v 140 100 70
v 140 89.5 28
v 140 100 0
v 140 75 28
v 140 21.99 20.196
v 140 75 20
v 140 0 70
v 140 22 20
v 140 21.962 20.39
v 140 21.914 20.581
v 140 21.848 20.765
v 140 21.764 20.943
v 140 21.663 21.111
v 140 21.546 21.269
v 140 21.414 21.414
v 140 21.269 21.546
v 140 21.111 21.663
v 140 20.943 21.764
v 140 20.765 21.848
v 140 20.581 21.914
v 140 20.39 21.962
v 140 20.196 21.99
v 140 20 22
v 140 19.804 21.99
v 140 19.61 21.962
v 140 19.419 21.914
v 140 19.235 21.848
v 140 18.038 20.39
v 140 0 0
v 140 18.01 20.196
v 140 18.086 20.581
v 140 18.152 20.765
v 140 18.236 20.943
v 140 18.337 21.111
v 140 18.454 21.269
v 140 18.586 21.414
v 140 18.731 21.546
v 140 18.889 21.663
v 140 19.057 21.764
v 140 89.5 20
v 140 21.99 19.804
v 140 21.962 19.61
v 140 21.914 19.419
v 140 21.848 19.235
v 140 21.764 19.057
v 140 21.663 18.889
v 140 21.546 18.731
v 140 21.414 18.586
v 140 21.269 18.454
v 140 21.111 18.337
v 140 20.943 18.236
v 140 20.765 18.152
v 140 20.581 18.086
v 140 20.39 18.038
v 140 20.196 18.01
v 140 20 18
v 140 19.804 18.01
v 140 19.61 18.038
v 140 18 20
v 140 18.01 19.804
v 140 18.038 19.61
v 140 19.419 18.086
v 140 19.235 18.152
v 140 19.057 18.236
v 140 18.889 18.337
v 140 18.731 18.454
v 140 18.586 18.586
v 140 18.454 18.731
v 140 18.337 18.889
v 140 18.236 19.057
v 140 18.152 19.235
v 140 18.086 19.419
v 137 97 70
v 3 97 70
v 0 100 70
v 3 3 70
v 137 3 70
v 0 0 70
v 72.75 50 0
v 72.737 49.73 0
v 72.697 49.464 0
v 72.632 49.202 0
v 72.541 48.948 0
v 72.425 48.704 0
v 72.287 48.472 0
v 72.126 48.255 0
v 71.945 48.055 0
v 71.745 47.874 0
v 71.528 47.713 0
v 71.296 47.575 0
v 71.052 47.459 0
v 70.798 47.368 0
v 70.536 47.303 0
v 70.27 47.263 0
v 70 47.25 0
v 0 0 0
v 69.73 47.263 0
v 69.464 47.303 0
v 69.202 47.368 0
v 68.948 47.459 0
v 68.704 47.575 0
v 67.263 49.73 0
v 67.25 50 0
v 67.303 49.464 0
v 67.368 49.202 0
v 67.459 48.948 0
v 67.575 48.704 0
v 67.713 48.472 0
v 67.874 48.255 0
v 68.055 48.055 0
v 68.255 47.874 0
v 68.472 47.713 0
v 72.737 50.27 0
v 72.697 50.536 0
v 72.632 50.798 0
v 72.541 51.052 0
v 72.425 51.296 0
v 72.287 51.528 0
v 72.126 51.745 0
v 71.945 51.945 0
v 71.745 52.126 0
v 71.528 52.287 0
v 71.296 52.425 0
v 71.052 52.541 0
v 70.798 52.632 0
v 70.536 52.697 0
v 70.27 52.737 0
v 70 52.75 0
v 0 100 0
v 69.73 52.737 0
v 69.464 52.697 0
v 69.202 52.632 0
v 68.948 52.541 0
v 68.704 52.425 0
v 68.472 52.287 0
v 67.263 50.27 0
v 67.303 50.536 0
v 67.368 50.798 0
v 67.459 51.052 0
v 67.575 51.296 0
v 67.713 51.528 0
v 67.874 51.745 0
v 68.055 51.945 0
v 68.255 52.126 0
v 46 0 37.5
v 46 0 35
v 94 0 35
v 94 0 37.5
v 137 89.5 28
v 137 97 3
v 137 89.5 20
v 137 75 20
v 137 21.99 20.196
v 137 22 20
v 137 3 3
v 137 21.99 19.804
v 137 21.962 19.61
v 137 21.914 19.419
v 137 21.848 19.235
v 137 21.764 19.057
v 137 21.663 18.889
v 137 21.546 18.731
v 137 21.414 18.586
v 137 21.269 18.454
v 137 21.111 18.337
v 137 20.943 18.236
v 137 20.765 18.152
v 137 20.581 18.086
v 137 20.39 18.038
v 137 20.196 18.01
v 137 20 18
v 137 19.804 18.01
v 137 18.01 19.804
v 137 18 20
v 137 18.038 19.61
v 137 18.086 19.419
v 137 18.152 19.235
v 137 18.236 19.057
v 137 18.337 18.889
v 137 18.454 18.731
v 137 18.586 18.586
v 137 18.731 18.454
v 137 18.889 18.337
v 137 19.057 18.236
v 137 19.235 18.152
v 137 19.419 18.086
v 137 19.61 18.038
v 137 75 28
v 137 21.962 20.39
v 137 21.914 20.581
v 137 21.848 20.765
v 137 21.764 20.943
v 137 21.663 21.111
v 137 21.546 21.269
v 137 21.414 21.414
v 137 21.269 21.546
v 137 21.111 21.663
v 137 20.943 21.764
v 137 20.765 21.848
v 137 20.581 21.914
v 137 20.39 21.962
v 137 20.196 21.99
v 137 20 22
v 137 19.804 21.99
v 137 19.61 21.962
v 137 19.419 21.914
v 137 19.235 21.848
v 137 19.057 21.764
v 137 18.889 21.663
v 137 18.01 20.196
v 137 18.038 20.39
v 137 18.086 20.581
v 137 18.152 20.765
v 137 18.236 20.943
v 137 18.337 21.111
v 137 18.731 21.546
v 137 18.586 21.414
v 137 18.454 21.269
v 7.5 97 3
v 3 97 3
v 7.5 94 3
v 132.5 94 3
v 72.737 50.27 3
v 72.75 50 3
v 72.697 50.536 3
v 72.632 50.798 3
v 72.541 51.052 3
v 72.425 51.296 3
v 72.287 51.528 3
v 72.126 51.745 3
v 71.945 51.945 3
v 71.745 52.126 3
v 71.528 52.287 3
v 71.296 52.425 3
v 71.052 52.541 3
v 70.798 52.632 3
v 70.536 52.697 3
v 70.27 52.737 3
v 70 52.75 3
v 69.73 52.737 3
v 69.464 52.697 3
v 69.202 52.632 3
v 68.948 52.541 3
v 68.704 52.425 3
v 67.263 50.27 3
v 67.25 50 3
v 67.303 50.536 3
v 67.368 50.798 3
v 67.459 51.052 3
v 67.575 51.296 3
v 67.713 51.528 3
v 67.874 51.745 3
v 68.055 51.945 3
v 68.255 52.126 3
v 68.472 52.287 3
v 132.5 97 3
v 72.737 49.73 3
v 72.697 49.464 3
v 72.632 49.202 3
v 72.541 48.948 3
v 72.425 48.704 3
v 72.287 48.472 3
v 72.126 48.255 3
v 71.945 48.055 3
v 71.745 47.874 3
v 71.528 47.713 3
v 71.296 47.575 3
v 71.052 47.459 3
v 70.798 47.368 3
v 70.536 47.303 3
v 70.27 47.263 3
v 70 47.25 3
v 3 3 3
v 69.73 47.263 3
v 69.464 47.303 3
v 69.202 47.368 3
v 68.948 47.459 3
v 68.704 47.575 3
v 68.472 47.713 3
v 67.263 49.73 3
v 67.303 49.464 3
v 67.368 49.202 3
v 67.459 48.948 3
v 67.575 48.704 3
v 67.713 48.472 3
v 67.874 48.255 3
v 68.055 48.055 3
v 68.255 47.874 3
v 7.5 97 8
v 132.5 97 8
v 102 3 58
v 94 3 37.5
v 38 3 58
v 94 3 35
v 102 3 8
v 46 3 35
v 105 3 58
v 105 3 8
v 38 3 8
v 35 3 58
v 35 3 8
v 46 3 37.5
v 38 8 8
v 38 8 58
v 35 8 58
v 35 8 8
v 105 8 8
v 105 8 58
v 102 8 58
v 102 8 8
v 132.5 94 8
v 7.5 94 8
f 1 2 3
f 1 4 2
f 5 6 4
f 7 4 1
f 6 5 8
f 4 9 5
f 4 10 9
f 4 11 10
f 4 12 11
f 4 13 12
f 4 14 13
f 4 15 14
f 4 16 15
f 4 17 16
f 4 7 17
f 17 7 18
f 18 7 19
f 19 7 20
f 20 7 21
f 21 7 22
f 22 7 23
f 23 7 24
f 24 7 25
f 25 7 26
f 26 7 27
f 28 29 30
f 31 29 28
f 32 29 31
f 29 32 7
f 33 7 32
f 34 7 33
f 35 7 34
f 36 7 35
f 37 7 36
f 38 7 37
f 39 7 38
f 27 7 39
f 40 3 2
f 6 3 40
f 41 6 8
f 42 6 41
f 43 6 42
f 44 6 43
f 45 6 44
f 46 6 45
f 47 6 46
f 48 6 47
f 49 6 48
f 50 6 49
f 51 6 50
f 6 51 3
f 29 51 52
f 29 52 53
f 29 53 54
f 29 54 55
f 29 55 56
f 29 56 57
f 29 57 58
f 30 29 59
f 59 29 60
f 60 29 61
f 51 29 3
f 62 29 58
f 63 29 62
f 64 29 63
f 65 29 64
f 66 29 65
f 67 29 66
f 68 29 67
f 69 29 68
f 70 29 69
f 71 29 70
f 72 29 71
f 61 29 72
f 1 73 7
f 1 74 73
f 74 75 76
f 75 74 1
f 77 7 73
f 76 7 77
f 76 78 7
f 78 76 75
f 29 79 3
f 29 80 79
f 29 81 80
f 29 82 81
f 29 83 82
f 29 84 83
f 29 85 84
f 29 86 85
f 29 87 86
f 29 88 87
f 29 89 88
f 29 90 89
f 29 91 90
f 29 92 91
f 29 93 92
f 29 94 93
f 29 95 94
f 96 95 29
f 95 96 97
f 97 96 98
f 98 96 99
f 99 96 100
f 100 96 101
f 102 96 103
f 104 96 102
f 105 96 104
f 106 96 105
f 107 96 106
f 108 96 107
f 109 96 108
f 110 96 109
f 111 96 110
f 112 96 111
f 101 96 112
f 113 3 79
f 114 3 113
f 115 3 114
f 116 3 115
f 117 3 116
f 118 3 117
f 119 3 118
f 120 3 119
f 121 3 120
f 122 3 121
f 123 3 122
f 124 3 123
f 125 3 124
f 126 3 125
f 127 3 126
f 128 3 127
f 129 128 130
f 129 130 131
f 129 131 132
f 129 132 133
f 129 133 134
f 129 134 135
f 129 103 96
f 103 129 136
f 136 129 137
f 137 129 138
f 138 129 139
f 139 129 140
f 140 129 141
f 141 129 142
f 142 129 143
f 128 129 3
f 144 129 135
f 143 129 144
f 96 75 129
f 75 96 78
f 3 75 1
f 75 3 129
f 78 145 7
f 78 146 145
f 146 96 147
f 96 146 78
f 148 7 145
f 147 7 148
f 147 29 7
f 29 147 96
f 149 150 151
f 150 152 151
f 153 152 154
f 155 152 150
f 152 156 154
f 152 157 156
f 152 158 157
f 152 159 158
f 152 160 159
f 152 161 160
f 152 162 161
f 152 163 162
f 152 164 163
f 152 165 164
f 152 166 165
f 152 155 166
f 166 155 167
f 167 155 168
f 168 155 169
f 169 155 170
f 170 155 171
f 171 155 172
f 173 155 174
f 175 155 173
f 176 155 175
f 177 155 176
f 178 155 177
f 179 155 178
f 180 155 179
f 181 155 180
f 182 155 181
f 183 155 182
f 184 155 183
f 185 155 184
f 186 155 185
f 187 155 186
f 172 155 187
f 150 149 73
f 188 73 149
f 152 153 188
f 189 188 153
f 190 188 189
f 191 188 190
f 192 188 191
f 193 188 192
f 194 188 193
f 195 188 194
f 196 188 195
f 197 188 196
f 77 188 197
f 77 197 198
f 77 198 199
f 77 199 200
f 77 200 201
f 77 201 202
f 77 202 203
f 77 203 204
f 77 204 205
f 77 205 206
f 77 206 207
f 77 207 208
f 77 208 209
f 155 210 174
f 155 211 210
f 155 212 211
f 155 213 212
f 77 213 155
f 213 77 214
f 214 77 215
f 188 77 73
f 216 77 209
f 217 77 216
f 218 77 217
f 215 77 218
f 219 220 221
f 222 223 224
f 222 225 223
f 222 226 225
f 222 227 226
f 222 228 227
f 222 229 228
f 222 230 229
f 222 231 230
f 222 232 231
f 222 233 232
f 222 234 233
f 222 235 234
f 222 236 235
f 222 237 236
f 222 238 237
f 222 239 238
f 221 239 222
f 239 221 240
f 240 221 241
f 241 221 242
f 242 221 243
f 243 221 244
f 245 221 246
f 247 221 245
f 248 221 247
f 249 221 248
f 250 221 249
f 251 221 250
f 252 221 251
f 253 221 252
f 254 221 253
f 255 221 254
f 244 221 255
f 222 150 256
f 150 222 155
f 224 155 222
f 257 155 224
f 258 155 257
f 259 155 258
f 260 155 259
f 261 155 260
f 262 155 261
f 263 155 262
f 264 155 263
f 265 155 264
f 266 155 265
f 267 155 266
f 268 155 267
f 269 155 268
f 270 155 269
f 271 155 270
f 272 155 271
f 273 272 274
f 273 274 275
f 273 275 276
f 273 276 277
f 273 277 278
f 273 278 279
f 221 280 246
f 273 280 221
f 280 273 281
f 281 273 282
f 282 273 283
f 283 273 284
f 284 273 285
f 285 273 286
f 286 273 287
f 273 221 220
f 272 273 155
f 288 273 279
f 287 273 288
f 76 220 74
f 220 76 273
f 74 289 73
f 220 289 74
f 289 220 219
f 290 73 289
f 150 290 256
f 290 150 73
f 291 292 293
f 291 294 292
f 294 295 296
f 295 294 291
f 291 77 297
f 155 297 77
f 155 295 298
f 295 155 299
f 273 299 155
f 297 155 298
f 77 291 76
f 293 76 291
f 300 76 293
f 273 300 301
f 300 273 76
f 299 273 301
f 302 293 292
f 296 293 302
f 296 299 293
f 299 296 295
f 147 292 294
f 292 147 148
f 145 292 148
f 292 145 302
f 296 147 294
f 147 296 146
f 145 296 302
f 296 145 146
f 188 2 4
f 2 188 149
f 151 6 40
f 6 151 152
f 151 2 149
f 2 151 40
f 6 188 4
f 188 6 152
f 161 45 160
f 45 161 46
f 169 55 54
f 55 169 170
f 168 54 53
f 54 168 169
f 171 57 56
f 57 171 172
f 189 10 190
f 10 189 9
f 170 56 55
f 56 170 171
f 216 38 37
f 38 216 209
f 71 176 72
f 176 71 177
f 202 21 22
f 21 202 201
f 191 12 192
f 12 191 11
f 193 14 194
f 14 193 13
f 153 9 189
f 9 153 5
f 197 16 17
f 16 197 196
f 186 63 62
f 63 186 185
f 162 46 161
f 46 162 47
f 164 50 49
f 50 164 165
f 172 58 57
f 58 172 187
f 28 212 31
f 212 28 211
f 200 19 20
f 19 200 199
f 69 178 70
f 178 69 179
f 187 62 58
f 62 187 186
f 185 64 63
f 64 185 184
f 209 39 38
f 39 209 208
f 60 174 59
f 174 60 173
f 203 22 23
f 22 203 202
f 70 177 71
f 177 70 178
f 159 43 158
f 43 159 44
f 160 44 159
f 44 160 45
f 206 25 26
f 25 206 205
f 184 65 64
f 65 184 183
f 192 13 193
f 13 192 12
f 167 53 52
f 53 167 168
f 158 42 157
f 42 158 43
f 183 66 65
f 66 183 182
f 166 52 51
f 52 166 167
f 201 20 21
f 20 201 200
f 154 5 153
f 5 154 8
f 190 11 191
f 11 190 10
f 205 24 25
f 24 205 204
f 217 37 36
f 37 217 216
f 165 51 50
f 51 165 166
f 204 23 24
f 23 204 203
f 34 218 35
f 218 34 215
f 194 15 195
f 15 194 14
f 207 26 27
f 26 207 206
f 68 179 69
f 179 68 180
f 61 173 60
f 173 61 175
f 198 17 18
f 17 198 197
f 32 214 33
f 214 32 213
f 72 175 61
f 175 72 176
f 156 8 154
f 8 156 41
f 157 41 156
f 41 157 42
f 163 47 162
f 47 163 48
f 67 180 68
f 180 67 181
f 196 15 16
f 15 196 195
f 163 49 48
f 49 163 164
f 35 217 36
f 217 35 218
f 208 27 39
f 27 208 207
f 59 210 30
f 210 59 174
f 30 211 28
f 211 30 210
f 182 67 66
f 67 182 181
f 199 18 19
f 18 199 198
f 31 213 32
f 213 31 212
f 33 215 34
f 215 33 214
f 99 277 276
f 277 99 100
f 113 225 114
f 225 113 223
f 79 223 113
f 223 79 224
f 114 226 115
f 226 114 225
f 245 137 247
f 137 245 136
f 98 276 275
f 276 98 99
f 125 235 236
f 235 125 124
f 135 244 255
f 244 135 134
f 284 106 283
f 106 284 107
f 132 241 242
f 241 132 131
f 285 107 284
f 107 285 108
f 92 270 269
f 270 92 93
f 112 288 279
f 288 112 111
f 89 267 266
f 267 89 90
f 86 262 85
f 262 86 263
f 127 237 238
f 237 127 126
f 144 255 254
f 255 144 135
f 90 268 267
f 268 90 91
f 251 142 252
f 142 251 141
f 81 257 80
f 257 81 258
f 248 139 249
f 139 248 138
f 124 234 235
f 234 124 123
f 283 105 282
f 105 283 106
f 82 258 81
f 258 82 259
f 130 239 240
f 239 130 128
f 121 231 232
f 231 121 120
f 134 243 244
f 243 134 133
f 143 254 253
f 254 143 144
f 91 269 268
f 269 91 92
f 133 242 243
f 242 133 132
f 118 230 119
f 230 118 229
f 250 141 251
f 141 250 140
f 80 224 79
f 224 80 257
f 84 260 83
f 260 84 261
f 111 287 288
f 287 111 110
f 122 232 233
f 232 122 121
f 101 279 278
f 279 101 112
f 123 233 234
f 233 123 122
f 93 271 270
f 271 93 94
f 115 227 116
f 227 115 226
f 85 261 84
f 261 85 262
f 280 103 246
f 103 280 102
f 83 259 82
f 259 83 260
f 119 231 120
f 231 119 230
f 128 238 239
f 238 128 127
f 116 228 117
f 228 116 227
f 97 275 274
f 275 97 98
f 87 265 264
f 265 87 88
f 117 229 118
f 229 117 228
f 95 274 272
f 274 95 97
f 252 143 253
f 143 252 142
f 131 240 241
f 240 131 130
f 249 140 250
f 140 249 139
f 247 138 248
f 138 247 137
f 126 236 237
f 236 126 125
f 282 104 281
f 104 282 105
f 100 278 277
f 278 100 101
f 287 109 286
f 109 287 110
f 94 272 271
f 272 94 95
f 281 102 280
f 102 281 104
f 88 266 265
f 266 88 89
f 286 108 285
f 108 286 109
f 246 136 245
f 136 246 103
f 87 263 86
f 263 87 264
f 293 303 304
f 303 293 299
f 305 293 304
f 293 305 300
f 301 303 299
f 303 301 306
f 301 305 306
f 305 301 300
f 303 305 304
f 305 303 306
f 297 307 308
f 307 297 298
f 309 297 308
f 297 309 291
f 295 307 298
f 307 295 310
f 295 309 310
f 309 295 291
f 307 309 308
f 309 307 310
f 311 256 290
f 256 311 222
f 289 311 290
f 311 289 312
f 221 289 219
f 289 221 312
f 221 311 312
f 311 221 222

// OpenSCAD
// ============================================
// PT100 THERMOMETER ENCLOSURE
// Dimensions in mm
// ============================================

length = 140;
width  = 100;
height = 70;

wall   = 3;
bottom = 3;

// ============================================
// LCD HEADER-PIN SLOT — FRONT WALL
// ============================================

lcd_width  = 48;
lcd_height = 2.5;
lcd_x = (length - lcd_width)/2;
lcd_z = 35;

// ============================================
// USB HOLE — RIGHT WALL
// Near the Arduino
// ============================================

usb_width  = 14.5;
usb_height = 8;
usb_y = 75;
usb_z = 20;

// ============================================
// POTENTIOMETER HOLE — RIGHT WALL
// Near the perfboard
// Diameter = 4 mm (0.4 cm)
// ============================================

pot_diameter = 4;
pot_y = 20;
pot_z = 20;

// ============================================
// PT100 HOLE — BOTTOM
// ============================================

pt100_diameter = 5.5;

// ============================================
// BOX WITH ALL OPENINGS
// ============================================

difference() {
    // Outer box
    cube([length, width, height]);

    // Hollow interior — open top
    translate([wall, wall, bottom])
        cube([
            length - 2*wall,
            width - 2*wall,
            height
        ]);

    // LCD header-pin slot — front wall
    translate([lcd_x, -0.1, lcd_z])
        cube([
            lcd_width,
            wall + 0.2,
            lcd_height
        ]);

    // USB opening — right wall, near Arduino
    translate([
        length - wall - 0.1,
        usb_y,
        usb_z
    ])
        cube([
            wall + 0.2,
            usb_width,
            usb_height
        ]);

    // Potentiometer hole — right wall, near perfboard
    translate([
        length - wall - 0.1,
        pot_y,
        pot_z
    ])
        rotate([0, 90, 0])
            cylinder(
                d = pot_diameter,
                h = wall + 0.2,
                $fn = 64
            );

    // PT100 hole — bottom centre
    translate([
        length/2,
        width/2,
        -1
    ])
        cylinder(
            d = pt100_diameter,
            h = bottom + 2,
            $fn = 64
        );
}

// ============================================
// PERFBOARD SUPPORTS — FRONT INNER WALL
// Perfboard: 70 x 50 mm
// ============================================

translate([(length-70)/2, wall, 8])
    cube([3, 5, 50]);

translate([(length-70)/2+67, wall, 8])
    cube([3, 5, 50]);

// ============================================
// ARDUINO SUPPORT — BACK INNER WALL
// Arduino frame: 125 x 65 mm
// ============================================

translate([
    (length-125)/2,
    width-wall-3,
    3
])
    cube([125, 3, 5]);
